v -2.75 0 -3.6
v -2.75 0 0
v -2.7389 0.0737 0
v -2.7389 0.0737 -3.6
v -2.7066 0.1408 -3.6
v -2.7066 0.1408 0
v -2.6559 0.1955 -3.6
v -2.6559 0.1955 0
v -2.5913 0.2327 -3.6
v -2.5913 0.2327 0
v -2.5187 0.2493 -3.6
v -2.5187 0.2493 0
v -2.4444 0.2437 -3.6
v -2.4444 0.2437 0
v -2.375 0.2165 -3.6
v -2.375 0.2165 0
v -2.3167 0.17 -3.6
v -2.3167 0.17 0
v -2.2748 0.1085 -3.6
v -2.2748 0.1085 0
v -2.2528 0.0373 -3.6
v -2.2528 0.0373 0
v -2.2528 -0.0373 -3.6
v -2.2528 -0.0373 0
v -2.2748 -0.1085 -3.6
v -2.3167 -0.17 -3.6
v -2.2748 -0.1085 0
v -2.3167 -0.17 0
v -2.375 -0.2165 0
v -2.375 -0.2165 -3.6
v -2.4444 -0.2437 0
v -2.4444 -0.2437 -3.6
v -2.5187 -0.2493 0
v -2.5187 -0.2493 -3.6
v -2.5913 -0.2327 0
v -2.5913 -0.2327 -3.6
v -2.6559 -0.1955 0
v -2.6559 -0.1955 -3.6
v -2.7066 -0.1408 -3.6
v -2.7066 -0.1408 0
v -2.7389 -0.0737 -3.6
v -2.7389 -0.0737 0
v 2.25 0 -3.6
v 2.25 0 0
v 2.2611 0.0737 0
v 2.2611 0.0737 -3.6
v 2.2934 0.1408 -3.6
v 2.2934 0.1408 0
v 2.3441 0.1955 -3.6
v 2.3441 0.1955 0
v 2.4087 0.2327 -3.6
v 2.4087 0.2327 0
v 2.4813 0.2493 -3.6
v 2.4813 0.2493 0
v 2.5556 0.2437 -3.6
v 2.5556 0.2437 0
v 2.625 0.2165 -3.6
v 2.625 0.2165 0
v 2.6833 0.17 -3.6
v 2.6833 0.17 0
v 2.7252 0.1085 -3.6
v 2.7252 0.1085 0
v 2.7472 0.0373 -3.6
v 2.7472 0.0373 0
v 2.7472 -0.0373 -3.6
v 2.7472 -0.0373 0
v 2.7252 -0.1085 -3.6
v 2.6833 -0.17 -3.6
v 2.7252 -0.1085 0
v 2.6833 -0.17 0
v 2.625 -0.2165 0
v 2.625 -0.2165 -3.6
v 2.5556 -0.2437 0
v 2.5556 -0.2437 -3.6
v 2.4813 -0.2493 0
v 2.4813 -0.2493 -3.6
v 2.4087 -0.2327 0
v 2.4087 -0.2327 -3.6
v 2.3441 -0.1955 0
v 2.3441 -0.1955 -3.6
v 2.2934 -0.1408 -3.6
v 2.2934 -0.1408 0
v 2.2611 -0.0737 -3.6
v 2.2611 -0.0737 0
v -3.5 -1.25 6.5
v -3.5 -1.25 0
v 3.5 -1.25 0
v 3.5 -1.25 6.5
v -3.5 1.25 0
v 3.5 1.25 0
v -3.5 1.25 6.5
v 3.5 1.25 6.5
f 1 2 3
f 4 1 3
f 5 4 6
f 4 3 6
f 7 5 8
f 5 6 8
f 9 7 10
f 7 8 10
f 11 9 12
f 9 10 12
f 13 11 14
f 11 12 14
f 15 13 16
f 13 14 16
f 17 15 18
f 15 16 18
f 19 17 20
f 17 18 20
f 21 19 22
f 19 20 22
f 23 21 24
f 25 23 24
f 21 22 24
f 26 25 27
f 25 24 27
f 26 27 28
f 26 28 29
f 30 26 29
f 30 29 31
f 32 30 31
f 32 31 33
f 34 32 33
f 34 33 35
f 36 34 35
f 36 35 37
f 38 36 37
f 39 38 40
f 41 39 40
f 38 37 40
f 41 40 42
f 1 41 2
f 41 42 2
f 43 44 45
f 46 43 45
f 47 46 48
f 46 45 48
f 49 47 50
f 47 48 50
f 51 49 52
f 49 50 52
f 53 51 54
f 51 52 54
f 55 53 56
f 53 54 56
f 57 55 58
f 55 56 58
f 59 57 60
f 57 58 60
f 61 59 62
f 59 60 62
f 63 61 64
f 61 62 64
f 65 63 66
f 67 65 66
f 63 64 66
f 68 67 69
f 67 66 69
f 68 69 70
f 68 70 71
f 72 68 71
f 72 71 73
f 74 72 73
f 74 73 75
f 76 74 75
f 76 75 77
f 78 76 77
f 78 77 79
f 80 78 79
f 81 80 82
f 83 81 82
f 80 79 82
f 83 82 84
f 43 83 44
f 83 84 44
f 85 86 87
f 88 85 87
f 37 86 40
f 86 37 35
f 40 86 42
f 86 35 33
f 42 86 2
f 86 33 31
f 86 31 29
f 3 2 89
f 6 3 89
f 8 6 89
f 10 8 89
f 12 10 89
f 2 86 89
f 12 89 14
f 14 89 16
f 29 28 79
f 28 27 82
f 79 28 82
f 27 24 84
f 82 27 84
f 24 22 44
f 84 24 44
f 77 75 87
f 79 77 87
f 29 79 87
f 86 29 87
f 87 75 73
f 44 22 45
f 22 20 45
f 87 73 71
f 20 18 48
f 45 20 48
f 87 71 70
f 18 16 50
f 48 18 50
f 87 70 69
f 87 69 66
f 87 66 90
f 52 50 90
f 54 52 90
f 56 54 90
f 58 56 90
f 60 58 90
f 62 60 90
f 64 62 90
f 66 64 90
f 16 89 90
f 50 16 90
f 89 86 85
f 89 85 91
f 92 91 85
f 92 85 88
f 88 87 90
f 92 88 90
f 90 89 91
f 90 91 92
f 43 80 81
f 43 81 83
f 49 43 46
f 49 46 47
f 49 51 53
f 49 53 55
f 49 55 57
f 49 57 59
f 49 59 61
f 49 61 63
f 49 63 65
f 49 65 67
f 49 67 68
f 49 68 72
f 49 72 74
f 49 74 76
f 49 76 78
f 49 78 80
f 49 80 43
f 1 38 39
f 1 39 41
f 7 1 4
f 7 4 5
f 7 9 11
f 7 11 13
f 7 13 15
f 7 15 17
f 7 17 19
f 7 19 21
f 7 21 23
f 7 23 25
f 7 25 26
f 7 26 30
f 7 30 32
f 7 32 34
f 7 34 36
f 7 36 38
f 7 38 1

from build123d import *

# Parameters (mm, degrees)
ESQUISSE1_W        = 7
ESQUISSE1_H        = 2.5
BOSS_EXTRU_1_DEPTH = 6.5
ESQUISSE2_R        = 0.25
BOSS_EXTRU_2_DEPTH = 3.6


with BuildPart() as part:
    # Esquisse1 → Boss.-Extru.1 (new body)
    with BuildSketch(Plane.XY):
        Rectangle(ESQUISSE1_W, ESQUISSE1_H)
    extrude(amount=BOSS_EXTRU_1_DEPTH)

    # Esquisse2 → Boss.-Extru.2 (add)
    with BuildSketch(Plane(origin=(0, 0, 0), x_dir=(-1, 0, 0), z_dir=(0, 0, -1))):
        with Locations((-2.5, 0)):
            Circle(ESQUISSE2_R)
        with Locations((2.5, 0)):
            Circle(ESQUISSE2_R)
    extrude(amount=BOSS_EXTRU_2_DEPTH)


solid = part.part
